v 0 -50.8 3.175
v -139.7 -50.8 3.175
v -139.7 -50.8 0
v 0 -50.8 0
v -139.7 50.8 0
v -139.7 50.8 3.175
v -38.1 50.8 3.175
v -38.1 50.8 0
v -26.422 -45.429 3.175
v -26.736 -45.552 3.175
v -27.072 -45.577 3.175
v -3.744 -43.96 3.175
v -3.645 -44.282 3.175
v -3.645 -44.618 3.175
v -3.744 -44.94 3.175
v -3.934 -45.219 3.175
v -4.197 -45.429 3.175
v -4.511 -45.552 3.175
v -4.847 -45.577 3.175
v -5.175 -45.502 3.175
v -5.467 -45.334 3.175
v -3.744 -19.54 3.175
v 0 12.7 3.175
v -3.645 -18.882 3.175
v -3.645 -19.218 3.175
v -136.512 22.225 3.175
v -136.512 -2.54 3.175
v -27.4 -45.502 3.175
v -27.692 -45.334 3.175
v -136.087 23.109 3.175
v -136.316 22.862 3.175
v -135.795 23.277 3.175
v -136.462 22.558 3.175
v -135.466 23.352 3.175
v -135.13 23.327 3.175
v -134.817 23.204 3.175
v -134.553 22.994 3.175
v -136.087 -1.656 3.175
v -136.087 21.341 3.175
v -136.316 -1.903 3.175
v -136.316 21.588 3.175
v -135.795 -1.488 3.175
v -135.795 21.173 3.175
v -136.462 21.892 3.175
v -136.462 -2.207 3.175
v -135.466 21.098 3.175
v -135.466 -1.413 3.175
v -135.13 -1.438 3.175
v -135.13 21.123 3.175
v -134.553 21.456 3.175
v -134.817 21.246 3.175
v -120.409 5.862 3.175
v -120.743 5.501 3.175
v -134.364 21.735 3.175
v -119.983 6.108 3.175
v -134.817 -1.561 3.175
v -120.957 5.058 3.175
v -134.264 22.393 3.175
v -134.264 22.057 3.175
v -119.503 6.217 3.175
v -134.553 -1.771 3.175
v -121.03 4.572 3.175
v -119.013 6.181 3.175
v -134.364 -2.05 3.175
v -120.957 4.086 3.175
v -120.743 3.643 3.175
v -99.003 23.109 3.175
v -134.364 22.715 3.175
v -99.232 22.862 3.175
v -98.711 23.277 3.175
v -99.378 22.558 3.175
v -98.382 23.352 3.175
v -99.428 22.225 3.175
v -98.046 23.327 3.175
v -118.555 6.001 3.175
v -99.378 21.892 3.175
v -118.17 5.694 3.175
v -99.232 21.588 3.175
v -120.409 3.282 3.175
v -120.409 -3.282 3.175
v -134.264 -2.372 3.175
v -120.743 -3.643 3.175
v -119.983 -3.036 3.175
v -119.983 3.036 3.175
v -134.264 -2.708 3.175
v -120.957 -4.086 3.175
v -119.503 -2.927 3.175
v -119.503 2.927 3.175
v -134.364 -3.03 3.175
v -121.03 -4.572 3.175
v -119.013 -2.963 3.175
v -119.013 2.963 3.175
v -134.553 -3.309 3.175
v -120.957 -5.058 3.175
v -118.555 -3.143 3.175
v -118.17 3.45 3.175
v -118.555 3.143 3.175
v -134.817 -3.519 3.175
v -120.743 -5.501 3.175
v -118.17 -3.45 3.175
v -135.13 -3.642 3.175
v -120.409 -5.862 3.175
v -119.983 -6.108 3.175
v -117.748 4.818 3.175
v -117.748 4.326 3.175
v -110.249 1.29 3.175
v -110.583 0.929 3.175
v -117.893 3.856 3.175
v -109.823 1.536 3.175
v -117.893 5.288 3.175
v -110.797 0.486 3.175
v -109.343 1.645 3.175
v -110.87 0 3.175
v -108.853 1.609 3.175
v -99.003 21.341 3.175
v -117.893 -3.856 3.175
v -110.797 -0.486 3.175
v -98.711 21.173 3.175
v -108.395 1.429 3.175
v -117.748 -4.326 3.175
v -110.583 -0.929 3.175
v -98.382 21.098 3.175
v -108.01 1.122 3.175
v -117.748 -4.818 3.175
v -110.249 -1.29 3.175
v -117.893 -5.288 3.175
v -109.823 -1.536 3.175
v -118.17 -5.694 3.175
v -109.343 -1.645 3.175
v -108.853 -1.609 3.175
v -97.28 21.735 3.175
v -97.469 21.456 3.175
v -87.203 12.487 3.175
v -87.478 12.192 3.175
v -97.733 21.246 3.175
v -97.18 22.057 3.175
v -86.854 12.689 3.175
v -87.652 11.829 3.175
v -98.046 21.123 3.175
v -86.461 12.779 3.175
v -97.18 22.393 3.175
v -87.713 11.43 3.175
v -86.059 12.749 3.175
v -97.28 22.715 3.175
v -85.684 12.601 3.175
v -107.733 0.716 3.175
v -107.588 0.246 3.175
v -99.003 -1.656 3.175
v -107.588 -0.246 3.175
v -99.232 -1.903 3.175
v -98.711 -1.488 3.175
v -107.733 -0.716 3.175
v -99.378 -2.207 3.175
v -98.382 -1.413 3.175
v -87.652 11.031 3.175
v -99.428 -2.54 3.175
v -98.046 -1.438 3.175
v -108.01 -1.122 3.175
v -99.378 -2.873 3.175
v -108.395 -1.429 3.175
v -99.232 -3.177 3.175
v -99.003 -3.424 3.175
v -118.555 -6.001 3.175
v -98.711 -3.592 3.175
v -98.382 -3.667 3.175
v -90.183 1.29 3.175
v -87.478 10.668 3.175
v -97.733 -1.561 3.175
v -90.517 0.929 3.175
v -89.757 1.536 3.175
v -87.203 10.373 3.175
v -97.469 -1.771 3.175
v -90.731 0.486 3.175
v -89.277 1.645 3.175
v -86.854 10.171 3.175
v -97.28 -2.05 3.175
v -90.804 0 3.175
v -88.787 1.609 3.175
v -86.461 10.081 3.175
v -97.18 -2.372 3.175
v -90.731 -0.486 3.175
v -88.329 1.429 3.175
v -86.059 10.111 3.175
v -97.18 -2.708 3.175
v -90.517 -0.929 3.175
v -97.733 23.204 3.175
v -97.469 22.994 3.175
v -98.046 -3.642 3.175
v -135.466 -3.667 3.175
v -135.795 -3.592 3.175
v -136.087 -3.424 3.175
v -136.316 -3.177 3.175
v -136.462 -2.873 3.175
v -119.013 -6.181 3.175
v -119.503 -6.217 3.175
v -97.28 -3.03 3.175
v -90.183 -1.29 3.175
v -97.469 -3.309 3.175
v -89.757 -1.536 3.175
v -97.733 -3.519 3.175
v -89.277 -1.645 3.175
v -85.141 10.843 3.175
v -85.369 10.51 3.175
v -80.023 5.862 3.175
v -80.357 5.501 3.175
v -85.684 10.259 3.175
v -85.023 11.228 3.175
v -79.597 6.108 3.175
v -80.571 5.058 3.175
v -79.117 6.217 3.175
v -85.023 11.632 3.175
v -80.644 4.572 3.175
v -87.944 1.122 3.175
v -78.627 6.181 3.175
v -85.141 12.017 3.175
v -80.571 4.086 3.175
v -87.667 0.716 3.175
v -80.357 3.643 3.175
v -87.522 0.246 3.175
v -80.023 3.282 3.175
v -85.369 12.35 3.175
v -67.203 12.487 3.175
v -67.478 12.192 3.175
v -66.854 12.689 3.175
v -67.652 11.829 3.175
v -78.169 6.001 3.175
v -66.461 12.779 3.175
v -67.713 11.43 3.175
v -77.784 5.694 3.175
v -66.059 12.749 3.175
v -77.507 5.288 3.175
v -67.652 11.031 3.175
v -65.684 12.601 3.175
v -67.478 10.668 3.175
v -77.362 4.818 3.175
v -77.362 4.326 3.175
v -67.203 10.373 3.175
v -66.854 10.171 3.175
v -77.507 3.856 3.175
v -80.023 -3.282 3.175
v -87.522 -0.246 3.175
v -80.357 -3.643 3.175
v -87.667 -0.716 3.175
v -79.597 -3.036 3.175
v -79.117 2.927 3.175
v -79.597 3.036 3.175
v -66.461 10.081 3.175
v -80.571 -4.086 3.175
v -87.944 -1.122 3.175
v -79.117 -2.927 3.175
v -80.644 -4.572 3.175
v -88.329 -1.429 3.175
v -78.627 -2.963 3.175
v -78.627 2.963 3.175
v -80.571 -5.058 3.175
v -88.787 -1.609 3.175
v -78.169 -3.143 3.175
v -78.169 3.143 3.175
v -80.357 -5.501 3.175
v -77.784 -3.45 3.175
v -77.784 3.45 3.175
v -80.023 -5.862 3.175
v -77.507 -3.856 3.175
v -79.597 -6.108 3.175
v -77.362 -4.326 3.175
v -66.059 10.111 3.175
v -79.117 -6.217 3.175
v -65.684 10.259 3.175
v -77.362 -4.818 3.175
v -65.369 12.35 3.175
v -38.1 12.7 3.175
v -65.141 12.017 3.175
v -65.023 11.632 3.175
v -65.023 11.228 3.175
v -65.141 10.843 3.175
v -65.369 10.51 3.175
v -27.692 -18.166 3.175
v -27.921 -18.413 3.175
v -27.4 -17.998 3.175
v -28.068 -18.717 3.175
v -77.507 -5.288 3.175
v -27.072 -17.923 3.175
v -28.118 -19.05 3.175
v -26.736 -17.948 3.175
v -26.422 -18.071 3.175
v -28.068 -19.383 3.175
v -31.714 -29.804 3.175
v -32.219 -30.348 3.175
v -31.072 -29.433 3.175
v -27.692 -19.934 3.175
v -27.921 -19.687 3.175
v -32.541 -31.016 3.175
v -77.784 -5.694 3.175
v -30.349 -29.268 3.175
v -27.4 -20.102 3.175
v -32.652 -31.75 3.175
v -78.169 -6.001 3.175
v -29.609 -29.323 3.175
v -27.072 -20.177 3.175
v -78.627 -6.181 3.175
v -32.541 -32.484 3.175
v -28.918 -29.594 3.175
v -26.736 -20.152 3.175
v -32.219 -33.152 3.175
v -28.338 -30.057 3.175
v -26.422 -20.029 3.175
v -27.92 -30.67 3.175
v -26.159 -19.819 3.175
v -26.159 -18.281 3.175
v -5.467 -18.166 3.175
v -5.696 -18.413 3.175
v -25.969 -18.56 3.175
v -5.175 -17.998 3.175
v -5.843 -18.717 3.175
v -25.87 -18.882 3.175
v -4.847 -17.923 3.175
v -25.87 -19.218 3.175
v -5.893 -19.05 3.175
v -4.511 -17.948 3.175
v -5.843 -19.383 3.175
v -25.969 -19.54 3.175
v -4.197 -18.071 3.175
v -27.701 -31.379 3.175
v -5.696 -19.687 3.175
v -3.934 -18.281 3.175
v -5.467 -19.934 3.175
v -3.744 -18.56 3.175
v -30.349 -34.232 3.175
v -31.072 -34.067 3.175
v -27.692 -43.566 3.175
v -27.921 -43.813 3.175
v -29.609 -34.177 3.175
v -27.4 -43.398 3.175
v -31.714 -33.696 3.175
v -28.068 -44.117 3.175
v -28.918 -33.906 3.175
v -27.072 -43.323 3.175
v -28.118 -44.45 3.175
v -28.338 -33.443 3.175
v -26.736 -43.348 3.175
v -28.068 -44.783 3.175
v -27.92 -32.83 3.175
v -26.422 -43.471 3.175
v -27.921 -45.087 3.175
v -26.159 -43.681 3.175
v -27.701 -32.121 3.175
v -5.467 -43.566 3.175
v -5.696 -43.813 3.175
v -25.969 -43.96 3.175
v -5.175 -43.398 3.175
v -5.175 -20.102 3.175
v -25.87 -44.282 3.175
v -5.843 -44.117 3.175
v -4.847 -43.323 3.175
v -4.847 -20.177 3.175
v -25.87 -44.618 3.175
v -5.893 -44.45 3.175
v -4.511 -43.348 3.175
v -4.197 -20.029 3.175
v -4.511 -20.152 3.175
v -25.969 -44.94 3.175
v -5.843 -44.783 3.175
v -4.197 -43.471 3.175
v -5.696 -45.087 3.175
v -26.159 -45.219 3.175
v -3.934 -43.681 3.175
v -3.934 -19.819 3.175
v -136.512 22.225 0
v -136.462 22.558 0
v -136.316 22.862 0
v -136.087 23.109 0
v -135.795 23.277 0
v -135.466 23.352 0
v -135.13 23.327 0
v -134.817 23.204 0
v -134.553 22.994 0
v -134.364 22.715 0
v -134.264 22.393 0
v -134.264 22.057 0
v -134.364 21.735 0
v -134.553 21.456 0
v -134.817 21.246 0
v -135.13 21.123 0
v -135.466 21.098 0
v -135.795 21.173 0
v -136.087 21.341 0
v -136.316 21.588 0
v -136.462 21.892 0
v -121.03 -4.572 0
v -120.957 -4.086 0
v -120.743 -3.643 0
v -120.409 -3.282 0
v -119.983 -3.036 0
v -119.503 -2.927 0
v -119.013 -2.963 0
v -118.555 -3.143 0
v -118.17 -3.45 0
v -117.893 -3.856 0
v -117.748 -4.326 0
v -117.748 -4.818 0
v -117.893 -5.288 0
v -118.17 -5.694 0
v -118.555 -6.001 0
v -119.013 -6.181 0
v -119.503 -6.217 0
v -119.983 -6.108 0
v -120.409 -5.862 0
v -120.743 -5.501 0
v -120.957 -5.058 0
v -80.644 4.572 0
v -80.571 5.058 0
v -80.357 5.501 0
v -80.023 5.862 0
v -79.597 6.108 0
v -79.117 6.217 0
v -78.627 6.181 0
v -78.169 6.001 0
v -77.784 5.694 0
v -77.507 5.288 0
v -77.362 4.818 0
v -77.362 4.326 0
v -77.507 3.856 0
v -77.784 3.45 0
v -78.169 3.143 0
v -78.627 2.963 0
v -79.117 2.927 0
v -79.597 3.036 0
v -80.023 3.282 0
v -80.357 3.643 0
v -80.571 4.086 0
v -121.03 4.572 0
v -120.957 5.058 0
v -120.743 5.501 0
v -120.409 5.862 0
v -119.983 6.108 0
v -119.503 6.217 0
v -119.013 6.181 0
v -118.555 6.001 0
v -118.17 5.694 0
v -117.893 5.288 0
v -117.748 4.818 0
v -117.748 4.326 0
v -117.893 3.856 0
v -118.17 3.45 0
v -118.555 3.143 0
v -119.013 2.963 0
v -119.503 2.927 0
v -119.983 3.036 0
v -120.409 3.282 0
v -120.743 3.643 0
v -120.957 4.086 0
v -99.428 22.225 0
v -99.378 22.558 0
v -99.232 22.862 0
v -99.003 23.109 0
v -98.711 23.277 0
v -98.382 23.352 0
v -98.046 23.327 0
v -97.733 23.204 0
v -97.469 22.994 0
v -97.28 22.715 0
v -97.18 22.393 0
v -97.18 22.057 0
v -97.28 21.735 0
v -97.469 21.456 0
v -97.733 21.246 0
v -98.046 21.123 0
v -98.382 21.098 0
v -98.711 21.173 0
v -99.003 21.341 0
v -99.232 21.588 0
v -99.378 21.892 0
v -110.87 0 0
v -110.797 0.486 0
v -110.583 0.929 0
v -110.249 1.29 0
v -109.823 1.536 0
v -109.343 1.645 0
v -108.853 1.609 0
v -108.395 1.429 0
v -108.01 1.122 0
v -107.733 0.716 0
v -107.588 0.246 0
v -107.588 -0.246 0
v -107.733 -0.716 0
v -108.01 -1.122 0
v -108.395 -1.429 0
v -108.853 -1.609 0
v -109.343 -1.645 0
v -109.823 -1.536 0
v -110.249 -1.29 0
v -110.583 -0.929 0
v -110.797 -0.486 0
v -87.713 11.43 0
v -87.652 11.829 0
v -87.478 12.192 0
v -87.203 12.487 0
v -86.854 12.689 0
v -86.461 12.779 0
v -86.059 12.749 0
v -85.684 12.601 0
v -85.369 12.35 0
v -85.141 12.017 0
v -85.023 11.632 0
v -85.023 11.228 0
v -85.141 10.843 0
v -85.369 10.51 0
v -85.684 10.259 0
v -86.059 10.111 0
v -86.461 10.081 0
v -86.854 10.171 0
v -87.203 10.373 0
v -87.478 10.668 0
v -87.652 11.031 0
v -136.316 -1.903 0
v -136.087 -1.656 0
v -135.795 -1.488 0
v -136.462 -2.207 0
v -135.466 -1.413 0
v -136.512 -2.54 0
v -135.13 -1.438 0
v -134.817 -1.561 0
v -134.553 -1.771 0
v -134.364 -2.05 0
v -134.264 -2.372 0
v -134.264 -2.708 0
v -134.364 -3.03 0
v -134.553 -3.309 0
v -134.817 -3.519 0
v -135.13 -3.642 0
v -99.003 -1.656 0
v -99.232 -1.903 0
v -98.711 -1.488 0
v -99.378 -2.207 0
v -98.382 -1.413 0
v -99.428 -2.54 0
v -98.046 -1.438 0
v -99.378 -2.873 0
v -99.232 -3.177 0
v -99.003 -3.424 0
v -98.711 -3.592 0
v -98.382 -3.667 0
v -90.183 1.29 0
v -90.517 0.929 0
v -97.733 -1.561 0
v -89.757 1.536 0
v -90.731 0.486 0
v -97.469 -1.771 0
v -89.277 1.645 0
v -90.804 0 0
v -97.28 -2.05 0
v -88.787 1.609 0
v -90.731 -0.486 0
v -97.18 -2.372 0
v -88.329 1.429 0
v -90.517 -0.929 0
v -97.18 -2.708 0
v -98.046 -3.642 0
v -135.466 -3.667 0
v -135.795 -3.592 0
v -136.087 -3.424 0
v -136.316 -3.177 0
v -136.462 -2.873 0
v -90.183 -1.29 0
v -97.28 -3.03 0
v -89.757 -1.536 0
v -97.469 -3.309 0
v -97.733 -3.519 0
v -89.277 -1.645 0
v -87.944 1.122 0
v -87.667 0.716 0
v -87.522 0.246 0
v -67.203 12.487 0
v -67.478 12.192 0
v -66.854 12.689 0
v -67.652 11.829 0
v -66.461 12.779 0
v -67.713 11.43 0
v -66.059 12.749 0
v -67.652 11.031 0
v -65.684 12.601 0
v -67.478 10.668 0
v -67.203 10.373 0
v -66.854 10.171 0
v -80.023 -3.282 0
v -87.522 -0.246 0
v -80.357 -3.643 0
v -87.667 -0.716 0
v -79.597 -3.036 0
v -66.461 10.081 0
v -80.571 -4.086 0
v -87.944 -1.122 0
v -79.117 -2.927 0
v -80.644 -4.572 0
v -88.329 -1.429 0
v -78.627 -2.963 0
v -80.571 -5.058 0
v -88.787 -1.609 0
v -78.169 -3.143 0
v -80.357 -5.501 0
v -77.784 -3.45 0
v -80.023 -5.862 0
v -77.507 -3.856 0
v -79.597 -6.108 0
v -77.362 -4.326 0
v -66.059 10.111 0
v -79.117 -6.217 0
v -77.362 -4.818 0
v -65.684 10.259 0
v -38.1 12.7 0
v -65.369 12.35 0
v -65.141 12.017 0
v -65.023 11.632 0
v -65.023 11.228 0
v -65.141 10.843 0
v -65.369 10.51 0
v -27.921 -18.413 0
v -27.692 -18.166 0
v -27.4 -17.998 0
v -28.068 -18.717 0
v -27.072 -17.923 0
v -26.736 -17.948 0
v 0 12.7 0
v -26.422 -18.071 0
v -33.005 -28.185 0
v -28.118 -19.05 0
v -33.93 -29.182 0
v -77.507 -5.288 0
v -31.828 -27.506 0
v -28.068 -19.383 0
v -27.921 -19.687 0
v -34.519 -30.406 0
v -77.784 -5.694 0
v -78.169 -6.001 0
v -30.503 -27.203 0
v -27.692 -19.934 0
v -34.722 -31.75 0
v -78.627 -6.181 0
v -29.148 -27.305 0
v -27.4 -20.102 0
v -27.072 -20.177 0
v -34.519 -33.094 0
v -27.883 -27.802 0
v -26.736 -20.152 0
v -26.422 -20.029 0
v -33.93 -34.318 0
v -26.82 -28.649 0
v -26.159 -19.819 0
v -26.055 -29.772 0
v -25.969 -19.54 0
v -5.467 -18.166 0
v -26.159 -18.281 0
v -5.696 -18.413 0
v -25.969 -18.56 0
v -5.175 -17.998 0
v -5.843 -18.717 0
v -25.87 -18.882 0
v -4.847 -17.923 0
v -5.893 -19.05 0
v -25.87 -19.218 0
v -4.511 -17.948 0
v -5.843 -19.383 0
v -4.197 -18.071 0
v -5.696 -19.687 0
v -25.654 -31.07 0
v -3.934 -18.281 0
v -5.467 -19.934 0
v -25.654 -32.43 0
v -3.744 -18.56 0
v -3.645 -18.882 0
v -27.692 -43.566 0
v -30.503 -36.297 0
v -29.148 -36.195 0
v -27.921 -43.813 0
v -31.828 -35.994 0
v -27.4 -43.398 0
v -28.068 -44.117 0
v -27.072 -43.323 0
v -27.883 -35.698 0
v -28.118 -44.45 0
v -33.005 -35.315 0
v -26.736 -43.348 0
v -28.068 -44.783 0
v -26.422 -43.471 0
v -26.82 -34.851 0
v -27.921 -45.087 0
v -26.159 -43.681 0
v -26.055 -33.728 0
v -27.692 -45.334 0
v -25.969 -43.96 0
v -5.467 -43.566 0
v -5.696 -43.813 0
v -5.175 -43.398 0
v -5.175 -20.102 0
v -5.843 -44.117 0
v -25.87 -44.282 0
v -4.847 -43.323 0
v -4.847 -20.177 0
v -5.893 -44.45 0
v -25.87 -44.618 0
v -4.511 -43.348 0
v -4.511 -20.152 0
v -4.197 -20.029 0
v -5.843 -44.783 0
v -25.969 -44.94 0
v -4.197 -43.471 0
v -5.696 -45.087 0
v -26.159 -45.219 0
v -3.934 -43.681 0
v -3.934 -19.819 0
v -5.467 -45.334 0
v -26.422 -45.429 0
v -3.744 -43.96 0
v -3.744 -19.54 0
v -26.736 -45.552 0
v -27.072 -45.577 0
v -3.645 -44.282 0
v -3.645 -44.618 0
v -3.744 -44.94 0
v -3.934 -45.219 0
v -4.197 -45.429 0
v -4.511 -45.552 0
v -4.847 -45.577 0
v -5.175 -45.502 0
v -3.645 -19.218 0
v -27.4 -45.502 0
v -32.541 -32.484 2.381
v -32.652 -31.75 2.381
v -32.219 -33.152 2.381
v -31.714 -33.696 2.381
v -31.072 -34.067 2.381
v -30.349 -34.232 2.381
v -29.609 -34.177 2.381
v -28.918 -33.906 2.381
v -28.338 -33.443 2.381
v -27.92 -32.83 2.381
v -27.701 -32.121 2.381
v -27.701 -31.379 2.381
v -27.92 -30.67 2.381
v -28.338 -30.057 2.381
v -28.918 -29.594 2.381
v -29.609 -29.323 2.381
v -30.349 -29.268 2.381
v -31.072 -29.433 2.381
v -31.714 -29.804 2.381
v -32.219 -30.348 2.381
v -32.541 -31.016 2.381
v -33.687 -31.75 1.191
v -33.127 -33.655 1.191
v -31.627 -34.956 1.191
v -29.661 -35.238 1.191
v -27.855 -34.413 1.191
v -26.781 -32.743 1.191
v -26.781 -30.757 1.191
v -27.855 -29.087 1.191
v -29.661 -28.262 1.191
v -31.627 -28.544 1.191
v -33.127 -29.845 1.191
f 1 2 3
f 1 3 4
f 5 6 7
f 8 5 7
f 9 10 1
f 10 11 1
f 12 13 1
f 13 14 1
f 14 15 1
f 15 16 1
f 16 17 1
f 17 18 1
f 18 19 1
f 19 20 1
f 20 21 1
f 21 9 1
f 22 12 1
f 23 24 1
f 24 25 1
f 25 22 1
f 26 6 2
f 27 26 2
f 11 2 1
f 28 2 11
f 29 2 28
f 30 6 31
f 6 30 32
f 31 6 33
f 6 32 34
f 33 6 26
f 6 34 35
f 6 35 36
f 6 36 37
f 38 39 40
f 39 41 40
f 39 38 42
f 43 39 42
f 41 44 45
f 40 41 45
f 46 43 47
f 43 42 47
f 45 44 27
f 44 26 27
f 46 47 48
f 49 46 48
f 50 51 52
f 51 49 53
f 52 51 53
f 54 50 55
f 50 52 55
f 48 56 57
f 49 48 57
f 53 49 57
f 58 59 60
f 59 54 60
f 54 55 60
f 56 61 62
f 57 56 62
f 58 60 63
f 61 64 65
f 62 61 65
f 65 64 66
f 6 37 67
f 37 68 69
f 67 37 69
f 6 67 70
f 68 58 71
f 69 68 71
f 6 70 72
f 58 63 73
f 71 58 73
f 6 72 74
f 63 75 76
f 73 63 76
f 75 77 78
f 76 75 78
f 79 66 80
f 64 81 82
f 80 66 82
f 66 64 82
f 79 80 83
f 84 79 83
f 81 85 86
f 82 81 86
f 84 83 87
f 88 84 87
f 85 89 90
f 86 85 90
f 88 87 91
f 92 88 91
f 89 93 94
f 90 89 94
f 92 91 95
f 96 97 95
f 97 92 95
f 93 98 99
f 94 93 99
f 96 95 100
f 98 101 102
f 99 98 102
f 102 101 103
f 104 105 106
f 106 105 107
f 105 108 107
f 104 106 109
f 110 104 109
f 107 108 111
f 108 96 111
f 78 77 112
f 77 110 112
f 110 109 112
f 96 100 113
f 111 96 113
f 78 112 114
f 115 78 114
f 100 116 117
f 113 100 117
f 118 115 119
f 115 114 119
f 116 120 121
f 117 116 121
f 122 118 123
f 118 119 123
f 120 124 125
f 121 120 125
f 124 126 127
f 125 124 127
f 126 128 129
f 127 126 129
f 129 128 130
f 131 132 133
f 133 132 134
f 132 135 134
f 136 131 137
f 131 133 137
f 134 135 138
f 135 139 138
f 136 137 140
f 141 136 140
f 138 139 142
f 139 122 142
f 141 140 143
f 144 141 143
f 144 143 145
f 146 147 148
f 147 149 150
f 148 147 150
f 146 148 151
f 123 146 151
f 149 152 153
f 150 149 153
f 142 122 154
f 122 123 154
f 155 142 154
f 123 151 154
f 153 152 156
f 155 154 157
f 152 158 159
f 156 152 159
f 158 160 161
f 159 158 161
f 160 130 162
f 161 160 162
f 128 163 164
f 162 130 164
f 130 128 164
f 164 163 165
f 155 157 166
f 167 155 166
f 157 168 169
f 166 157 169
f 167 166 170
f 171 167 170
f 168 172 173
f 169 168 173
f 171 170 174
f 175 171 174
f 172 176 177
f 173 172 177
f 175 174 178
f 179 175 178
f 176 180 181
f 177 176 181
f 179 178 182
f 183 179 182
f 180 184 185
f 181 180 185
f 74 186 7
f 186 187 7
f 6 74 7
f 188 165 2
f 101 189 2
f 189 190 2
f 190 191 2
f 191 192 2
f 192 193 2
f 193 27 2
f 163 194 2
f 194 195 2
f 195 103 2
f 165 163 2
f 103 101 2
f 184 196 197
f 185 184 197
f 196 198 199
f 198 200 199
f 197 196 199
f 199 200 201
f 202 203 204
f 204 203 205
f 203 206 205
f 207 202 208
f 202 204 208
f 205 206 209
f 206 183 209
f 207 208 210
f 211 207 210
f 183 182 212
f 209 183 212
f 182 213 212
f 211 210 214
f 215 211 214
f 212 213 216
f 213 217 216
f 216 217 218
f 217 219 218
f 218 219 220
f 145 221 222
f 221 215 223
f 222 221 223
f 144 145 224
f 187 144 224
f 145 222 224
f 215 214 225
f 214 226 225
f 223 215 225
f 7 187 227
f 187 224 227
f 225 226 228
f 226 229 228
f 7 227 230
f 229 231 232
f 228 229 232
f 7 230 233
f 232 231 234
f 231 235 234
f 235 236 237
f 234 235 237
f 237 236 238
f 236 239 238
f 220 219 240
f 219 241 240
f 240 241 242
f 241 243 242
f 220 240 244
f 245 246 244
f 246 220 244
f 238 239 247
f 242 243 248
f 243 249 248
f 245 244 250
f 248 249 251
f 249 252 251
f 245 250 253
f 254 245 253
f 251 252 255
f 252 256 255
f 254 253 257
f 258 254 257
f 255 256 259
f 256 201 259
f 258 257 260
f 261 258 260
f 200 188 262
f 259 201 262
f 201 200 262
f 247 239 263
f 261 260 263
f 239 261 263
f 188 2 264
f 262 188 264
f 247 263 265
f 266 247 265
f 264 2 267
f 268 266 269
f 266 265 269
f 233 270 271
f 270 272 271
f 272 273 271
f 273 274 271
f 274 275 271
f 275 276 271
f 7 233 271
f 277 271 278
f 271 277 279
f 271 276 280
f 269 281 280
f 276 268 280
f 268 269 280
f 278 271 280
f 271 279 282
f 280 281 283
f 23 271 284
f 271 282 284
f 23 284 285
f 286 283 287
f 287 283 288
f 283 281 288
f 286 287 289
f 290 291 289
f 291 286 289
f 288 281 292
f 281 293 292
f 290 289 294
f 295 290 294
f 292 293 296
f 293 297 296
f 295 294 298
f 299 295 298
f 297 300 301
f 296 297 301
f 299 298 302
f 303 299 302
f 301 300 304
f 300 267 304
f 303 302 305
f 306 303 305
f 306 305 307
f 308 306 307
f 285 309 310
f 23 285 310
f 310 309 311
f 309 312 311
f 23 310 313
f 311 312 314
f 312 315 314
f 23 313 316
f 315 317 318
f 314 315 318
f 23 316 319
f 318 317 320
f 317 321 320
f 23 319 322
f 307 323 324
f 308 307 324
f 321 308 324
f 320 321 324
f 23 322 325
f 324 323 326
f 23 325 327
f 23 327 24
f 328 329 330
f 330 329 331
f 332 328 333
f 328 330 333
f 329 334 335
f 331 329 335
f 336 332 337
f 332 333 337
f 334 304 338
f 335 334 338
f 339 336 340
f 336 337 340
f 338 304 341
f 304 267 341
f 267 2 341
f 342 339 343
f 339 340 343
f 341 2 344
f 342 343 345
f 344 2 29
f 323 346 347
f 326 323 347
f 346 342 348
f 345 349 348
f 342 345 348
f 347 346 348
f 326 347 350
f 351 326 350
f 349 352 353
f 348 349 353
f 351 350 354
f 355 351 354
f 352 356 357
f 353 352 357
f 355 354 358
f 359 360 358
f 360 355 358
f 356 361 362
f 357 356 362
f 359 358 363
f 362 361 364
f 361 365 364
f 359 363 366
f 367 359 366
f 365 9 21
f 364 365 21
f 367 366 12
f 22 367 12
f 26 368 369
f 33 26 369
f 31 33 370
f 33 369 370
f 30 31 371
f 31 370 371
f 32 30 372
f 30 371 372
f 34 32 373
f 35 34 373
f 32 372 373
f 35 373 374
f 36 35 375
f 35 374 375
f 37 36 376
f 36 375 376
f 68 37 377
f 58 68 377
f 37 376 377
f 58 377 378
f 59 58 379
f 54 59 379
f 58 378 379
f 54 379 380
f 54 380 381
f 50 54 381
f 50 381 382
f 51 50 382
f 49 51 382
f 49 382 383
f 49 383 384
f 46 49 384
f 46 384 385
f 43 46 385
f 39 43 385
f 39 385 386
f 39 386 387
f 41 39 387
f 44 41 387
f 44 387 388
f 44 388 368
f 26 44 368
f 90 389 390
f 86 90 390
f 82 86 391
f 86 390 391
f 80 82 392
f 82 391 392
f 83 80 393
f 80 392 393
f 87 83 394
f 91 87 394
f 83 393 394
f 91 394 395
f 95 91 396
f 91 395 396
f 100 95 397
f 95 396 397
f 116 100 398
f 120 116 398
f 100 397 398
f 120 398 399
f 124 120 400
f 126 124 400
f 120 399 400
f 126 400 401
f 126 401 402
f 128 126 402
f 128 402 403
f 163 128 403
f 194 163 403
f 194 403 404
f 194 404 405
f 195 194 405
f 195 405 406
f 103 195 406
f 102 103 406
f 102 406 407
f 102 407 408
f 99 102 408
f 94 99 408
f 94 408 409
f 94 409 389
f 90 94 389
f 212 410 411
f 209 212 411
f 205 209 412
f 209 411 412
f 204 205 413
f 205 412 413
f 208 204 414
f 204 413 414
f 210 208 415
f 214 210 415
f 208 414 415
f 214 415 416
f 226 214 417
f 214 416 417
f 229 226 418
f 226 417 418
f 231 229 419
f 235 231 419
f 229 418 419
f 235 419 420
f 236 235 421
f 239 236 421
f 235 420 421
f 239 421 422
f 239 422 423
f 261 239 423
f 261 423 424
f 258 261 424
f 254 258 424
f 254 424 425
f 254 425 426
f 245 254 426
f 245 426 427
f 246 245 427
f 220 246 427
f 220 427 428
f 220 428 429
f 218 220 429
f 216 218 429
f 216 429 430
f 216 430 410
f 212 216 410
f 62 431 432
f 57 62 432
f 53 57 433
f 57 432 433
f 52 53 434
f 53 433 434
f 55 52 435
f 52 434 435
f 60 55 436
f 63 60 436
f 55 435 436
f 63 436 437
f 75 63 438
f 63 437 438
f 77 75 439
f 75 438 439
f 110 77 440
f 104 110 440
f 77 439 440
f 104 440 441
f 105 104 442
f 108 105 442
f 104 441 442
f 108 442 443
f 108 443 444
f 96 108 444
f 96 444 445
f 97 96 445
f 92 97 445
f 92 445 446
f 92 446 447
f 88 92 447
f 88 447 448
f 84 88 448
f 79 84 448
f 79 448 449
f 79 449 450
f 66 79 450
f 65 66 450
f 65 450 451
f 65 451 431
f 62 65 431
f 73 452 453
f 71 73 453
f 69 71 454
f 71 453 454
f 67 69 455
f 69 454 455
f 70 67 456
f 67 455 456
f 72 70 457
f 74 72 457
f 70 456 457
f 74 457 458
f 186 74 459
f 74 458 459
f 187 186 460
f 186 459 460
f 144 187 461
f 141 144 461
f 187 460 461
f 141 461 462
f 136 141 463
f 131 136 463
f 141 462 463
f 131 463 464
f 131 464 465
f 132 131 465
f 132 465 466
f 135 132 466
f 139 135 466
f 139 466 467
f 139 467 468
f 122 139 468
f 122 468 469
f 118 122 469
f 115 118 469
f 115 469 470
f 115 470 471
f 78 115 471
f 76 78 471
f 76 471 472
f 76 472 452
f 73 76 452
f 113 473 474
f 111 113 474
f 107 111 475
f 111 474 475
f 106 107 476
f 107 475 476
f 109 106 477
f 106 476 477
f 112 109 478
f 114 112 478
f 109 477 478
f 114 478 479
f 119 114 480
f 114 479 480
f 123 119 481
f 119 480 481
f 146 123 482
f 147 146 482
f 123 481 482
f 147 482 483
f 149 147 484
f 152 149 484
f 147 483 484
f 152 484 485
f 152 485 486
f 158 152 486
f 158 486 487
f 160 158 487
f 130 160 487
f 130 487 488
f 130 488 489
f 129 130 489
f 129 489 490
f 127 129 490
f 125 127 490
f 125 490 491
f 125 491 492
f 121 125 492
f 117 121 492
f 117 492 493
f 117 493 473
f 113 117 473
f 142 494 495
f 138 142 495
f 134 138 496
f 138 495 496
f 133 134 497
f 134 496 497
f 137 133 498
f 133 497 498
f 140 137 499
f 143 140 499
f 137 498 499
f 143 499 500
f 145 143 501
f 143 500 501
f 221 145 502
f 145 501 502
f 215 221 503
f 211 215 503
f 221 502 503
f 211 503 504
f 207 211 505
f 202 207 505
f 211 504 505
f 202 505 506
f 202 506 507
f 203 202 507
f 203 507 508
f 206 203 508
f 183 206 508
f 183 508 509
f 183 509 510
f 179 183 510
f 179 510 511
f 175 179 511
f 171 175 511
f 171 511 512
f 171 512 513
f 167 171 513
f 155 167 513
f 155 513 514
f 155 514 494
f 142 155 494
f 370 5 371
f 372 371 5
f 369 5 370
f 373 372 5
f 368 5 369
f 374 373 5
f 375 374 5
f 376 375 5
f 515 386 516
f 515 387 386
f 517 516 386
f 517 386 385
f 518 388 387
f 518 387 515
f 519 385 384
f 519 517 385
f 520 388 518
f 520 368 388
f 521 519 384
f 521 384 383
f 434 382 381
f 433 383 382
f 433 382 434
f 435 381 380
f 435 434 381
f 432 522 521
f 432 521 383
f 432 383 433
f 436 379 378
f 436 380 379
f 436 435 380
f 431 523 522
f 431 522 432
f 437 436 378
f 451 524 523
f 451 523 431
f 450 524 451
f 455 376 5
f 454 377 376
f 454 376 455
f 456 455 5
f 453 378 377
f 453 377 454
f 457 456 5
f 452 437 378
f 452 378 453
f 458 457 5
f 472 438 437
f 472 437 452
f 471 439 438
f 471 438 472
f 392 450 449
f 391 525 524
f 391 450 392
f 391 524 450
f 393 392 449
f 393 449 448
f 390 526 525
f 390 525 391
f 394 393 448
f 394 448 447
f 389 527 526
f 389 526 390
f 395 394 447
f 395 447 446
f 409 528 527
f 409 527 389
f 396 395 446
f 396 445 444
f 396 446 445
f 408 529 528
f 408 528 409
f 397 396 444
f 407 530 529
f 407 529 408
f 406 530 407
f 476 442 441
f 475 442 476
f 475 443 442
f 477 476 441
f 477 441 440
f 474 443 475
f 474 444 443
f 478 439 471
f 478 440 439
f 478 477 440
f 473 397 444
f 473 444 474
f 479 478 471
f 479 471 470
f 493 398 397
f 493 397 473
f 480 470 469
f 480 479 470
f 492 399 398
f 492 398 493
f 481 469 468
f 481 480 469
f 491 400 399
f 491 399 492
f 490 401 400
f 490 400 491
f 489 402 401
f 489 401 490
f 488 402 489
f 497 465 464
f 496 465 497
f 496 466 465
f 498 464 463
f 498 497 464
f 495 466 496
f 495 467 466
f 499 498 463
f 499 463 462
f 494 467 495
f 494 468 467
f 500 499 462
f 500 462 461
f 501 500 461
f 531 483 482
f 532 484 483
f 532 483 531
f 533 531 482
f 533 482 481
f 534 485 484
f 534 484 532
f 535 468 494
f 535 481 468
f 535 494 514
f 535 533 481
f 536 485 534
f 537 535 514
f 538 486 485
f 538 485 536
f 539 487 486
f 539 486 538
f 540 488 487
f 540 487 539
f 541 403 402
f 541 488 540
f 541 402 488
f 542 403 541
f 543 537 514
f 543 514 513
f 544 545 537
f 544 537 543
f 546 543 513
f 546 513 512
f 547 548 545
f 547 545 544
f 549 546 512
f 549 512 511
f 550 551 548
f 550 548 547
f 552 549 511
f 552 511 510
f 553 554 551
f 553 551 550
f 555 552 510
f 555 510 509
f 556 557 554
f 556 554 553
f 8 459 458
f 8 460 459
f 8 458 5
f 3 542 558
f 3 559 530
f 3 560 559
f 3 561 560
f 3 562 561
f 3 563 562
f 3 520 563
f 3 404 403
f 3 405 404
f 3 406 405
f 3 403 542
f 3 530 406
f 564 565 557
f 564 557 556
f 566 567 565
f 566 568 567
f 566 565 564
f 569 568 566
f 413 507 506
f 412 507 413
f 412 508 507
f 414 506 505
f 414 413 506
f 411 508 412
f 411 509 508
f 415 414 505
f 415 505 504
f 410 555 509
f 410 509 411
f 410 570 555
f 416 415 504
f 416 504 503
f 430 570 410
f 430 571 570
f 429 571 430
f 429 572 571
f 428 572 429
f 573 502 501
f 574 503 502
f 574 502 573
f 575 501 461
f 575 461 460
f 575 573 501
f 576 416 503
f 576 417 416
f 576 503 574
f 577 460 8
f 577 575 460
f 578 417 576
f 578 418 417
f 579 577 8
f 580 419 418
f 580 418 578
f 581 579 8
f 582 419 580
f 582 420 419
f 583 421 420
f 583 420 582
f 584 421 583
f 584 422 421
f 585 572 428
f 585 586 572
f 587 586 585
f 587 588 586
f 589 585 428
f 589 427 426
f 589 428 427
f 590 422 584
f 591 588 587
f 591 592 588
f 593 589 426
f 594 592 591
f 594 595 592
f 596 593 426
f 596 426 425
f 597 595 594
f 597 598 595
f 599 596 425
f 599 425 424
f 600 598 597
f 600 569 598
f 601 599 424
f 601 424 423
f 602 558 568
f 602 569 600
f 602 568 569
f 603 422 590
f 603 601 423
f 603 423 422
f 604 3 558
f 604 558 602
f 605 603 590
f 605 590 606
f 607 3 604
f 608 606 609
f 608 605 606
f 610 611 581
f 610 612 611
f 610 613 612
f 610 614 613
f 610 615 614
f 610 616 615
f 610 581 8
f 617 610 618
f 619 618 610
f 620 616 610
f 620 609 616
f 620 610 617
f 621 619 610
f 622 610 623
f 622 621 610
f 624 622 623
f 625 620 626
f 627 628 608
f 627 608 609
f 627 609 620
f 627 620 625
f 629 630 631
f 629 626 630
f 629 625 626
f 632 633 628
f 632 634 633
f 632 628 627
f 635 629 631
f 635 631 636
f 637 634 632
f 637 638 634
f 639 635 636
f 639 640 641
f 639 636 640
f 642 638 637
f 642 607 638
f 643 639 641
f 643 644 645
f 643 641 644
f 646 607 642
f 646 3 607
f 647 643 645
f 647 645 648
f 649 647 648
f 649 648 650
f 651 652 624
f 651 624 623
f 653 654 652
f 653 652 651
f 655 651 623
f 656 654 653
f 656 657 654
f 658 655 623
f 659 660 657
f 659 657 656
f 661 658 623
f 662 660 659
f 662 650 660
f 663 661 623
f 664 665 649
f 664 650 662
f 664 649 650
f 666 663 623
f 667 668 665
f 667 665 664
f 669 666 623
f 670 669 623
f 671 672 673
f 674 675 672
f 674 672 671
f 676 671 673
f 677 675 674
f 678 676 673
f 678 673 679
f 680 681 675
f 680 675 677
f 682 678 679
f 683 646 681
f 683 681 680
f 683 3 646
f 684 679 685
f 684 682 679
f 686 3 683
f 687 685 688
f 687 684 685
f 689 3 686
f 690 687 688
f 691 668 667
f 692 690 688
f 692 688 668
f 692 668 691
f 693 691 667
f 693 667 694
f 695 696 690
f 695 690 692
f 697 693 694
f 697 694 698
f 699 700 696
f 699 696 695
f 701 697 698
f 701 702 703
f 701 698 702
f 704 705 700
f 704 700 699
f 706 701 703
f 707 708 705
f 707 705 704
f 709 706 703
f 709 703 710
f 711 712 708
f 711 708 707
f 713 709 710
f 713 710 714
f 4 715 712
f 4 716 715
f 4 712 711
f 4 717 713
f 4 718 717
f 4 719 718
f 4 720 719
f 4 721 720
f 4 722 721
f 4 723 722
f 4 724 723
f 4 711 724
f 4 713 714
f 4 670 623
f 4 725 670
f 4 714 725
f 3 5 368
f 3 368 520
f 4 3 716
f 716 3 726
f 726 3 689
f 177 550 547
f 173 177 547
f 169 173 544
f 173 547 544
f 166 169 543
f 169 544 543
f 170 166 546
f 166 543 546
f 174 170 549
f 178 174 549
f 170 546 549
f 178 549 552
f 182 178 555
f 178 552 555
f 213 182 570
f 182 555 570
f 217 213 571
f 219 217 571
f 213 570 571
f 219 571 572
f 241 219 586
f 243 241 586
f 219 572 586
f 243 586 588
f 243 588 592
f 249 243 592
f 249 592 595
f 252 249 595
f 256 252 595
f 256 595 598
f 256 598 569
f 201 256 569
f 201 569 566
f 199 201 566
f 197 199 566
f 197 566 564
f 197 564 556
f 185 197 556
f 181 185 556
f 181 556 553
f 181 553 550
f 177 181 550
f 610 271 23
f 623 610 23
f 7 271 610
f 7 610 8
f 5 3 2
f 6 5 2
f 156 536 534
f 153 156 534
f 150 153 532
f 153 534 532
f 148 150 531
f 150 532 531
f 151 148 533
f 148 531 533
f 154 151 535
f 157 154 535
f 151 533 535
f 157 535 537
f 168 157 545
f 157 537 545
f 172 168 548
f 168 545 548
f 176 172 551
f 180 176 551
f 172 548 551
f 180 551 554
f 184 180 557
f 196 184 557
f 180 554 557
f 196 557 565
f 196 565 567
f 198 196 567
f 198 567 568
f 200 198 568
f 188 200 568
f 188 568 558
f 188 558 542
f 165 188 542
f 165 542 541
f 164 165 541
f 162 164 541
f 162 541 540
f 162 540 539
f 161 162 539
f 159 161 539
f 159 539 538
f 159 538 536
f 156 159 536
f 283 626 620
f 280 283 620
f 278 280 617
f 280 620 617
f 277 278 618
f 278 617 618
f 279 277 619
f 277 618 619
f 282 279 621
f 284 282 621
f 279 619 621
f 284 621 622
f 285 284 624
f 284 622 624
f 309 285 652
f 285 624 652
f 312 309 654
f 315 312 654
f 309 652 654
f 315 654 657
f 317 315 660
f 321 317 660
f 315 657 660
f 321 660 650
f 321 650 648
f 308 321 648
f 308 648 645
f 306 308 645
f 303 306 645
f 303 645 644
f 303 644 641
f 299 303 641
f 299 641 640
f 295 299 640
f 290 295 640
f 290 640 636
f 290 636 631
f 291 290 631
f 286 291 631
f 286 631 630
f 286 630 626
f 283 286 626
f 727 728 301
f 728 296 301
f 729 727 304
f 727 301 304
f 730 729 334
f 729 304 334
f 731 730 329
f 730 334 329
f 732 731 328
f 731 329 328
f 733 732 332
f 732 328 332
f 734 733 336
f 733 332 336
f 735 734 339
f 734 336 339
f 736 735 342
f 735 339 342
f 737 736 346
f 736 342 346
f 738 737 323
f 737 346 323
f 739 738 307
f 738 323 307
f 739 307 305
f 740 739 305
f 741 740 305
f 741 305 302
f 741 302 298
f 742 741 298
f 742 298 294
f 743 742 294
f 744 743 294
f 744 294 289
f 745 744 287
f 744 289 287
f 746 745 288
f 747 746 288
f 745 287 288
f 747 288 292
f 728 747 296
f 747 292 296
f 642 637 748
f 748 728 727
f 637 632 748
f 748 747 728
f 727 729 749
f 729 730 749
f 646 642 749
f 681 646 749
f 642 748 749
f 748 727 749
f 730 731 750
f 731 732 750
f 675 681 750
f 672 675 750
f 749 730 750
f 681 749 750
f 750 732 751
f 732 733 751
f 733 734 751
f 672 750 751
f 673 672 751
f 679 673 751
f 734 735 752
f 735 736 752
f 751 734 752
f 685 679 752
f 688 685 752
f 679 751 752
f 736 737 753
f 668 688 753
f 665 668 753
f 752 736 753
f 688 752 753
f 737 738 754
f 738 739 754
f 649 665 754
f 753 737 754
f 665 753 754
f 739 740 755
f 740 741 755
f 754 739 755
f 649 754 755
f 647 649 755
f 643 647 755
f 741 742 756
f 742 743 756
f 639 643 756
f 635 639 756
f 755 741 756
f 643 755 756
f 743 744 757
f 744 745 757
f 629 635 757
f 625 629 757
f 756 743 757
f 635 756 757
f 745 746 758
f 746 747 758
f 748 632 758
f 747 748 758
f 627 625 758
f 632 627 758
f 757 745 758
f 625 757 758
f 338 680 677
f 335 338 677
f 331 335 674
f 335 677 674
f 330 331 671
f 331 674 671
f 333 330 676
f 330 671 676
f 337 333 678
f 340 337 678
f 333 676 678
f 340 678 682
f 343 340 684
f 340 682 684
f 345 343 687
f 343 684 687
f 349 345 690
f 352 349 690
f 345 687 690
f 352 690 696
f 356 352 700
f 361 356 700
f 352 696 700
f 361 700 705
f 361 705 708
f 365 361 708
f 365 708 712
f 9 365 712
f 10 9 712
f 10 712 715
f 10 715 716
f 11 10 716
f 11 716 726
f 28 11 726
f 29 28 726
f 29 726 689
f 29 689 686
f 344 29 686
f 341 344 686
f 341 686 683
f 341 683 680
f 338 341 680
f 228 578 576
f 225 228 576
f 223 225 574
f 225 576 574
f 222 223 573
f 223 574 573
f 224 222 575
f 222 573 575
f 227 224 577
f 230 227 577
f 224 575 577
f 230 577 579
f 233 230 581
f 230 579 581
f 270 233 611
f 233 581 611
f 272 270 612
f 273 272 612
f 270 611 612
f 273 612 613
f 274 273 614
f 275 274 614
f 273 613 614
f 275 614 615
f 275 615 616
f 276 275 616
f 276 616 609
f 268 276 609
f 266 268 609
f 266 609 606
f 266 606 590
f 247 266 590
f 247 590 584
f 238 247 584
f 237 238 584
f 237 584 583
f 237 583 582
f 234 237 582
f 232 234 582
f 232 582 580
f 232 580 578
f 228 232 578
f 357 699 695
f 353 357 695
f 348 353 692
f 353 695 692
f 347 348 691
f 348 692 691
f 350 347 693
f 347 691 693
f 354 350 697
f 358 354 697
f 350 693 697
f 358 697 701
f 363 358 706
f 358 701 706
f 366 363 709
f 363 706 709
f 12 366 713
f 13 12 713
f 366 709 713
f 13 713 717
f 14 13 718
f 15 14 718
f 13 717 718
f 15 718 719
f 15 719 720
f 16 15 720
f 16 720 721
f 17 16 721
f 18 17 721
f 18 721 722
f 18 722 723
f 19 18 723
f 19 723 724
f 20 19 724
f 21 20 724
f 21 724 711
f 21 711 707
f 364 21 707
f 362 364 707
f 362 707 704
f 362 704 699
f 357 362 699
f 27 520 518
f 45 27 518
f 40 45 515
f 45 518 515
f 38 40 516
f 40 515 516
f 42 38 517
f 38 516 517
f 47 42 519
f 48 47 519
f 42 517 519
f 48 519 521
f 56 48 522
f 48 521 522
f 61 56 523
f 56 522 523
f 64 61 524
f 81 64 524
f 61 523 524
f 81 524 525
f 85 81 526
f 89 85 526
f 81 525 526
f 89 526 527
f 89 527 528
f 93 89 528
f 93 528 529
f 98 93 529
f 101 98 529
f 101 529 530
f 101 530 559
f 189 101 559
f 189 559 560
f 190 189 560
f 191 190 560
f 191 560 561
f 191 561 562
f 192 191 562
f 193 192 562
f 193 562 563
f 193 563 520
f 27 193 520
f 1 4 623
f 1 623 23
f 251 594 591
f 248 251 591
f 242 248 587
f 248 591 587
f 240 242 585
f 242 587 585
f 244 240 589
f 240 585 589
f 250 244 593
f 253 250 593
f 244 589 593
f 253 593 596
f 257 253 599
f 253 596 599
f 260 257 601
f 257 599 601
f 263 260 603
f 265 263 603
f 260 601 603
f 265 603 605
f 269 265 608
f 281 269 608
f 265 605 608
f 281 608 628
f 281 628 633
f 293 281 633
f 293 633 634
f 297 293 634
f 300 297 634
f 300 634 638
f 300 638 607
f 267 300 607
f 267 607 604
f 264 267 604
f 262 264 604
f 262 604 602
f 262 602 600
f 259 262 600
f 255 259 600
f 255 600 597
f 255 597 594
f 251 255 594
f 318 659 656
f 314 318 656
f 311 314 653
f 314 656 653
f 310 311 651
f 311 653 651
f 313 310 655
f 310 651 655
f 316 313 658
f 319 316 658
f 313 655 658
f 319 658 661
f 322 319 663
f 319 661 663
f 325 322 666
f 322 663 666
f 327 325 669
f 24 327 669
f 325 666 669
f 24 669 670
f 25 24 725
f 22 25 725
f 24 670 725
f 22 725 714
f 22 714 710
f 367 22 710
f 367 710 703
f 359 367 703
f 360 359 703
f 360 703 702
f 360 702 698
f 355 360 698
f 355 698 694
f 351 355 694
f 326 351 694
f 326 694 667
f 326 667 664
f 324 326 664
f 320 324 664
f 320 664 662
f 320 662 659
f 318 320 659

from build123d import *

# Parameters (mm, degrees)
F0_W            = 139.7
F0_H            = 3.175
F1_DEPTH        = 50.8
F3_D            = 3.3
F4_W            = 38.1
F4_H            = 38.1
F5_DEPTH        = 3.176
F7_D            = 2.2606
F9_D            = 2.7051
F11_D           = 2.2606
F13_D           = 4.9784
F13_CSINK_D     = 9.1186
F13_CSINK_ANGLE = 82


with BuildPart() as f1:
    # F0 (on Front) → F1 (new body, symmetric)
    with BuildSketch(Plane.XZ):
        with Locations((-69.85, 1.5875)):
            Rectangle(F0_W, F0_H)
    extrude(amount=F1_DEPTH, both=True)

    # F3 (through all)
    with Locations(Plane.XY.offset(3.175)):
        with Locations((-78.994, 4.572), (-78.994, -4.572), (-89.154, 0), (-109.22, 0), (-119.38, 4.572), (-119.38, -4.572)):
            Hole(F3_D / 2)

    # F4 (on face) → F5 (cut, through all)
    with BuildSketch(Plane.XY.offset(3.175)):
        with Locations((-19.05, 31.75)):
            Rectangle(F4_W, F4_H)
    extrude(amount=-F5_DEPTH, mode=Mode.SUBTRACT)

    # F7 (through all)
    with Locations(Plane.XY.offset(3.175)):
        with Locations((-26.9875, -44.45), (-26.9875, -19.05), (-4.7625, -19.05), (-4.7625, -44.45)):
            Hole(F7_D / 2)

    # F9 (through all)
    with Locations(Plane.XY.offset(3.175)):
        with Locations((-86.36, 11.43), (-66.36, 11.43)):
            Hole(F9_D / 2)

    # F11 (through all)
    with Locations(Plane.XY.offset(3.175)):
        with Locations((-135.382, -2.54), (-98.298, -2.54), (-98.298, 22.225), (-135.382, 22.225)):
            Hole(F11_D / 2)

    # F13 (through all)
    with Locations(Plane(origin=(0, 0, 0), x_dir=(1, 0, 0), z_dir=(0, 0, -1))):
        with Locations((-30.1625, 31.75)):
            CounterSinkHole(F13_D / 2, F13_CSINK_D / 2, counter_sink_angle=F13_CSINK_ANGLE)


solid = f1.part
